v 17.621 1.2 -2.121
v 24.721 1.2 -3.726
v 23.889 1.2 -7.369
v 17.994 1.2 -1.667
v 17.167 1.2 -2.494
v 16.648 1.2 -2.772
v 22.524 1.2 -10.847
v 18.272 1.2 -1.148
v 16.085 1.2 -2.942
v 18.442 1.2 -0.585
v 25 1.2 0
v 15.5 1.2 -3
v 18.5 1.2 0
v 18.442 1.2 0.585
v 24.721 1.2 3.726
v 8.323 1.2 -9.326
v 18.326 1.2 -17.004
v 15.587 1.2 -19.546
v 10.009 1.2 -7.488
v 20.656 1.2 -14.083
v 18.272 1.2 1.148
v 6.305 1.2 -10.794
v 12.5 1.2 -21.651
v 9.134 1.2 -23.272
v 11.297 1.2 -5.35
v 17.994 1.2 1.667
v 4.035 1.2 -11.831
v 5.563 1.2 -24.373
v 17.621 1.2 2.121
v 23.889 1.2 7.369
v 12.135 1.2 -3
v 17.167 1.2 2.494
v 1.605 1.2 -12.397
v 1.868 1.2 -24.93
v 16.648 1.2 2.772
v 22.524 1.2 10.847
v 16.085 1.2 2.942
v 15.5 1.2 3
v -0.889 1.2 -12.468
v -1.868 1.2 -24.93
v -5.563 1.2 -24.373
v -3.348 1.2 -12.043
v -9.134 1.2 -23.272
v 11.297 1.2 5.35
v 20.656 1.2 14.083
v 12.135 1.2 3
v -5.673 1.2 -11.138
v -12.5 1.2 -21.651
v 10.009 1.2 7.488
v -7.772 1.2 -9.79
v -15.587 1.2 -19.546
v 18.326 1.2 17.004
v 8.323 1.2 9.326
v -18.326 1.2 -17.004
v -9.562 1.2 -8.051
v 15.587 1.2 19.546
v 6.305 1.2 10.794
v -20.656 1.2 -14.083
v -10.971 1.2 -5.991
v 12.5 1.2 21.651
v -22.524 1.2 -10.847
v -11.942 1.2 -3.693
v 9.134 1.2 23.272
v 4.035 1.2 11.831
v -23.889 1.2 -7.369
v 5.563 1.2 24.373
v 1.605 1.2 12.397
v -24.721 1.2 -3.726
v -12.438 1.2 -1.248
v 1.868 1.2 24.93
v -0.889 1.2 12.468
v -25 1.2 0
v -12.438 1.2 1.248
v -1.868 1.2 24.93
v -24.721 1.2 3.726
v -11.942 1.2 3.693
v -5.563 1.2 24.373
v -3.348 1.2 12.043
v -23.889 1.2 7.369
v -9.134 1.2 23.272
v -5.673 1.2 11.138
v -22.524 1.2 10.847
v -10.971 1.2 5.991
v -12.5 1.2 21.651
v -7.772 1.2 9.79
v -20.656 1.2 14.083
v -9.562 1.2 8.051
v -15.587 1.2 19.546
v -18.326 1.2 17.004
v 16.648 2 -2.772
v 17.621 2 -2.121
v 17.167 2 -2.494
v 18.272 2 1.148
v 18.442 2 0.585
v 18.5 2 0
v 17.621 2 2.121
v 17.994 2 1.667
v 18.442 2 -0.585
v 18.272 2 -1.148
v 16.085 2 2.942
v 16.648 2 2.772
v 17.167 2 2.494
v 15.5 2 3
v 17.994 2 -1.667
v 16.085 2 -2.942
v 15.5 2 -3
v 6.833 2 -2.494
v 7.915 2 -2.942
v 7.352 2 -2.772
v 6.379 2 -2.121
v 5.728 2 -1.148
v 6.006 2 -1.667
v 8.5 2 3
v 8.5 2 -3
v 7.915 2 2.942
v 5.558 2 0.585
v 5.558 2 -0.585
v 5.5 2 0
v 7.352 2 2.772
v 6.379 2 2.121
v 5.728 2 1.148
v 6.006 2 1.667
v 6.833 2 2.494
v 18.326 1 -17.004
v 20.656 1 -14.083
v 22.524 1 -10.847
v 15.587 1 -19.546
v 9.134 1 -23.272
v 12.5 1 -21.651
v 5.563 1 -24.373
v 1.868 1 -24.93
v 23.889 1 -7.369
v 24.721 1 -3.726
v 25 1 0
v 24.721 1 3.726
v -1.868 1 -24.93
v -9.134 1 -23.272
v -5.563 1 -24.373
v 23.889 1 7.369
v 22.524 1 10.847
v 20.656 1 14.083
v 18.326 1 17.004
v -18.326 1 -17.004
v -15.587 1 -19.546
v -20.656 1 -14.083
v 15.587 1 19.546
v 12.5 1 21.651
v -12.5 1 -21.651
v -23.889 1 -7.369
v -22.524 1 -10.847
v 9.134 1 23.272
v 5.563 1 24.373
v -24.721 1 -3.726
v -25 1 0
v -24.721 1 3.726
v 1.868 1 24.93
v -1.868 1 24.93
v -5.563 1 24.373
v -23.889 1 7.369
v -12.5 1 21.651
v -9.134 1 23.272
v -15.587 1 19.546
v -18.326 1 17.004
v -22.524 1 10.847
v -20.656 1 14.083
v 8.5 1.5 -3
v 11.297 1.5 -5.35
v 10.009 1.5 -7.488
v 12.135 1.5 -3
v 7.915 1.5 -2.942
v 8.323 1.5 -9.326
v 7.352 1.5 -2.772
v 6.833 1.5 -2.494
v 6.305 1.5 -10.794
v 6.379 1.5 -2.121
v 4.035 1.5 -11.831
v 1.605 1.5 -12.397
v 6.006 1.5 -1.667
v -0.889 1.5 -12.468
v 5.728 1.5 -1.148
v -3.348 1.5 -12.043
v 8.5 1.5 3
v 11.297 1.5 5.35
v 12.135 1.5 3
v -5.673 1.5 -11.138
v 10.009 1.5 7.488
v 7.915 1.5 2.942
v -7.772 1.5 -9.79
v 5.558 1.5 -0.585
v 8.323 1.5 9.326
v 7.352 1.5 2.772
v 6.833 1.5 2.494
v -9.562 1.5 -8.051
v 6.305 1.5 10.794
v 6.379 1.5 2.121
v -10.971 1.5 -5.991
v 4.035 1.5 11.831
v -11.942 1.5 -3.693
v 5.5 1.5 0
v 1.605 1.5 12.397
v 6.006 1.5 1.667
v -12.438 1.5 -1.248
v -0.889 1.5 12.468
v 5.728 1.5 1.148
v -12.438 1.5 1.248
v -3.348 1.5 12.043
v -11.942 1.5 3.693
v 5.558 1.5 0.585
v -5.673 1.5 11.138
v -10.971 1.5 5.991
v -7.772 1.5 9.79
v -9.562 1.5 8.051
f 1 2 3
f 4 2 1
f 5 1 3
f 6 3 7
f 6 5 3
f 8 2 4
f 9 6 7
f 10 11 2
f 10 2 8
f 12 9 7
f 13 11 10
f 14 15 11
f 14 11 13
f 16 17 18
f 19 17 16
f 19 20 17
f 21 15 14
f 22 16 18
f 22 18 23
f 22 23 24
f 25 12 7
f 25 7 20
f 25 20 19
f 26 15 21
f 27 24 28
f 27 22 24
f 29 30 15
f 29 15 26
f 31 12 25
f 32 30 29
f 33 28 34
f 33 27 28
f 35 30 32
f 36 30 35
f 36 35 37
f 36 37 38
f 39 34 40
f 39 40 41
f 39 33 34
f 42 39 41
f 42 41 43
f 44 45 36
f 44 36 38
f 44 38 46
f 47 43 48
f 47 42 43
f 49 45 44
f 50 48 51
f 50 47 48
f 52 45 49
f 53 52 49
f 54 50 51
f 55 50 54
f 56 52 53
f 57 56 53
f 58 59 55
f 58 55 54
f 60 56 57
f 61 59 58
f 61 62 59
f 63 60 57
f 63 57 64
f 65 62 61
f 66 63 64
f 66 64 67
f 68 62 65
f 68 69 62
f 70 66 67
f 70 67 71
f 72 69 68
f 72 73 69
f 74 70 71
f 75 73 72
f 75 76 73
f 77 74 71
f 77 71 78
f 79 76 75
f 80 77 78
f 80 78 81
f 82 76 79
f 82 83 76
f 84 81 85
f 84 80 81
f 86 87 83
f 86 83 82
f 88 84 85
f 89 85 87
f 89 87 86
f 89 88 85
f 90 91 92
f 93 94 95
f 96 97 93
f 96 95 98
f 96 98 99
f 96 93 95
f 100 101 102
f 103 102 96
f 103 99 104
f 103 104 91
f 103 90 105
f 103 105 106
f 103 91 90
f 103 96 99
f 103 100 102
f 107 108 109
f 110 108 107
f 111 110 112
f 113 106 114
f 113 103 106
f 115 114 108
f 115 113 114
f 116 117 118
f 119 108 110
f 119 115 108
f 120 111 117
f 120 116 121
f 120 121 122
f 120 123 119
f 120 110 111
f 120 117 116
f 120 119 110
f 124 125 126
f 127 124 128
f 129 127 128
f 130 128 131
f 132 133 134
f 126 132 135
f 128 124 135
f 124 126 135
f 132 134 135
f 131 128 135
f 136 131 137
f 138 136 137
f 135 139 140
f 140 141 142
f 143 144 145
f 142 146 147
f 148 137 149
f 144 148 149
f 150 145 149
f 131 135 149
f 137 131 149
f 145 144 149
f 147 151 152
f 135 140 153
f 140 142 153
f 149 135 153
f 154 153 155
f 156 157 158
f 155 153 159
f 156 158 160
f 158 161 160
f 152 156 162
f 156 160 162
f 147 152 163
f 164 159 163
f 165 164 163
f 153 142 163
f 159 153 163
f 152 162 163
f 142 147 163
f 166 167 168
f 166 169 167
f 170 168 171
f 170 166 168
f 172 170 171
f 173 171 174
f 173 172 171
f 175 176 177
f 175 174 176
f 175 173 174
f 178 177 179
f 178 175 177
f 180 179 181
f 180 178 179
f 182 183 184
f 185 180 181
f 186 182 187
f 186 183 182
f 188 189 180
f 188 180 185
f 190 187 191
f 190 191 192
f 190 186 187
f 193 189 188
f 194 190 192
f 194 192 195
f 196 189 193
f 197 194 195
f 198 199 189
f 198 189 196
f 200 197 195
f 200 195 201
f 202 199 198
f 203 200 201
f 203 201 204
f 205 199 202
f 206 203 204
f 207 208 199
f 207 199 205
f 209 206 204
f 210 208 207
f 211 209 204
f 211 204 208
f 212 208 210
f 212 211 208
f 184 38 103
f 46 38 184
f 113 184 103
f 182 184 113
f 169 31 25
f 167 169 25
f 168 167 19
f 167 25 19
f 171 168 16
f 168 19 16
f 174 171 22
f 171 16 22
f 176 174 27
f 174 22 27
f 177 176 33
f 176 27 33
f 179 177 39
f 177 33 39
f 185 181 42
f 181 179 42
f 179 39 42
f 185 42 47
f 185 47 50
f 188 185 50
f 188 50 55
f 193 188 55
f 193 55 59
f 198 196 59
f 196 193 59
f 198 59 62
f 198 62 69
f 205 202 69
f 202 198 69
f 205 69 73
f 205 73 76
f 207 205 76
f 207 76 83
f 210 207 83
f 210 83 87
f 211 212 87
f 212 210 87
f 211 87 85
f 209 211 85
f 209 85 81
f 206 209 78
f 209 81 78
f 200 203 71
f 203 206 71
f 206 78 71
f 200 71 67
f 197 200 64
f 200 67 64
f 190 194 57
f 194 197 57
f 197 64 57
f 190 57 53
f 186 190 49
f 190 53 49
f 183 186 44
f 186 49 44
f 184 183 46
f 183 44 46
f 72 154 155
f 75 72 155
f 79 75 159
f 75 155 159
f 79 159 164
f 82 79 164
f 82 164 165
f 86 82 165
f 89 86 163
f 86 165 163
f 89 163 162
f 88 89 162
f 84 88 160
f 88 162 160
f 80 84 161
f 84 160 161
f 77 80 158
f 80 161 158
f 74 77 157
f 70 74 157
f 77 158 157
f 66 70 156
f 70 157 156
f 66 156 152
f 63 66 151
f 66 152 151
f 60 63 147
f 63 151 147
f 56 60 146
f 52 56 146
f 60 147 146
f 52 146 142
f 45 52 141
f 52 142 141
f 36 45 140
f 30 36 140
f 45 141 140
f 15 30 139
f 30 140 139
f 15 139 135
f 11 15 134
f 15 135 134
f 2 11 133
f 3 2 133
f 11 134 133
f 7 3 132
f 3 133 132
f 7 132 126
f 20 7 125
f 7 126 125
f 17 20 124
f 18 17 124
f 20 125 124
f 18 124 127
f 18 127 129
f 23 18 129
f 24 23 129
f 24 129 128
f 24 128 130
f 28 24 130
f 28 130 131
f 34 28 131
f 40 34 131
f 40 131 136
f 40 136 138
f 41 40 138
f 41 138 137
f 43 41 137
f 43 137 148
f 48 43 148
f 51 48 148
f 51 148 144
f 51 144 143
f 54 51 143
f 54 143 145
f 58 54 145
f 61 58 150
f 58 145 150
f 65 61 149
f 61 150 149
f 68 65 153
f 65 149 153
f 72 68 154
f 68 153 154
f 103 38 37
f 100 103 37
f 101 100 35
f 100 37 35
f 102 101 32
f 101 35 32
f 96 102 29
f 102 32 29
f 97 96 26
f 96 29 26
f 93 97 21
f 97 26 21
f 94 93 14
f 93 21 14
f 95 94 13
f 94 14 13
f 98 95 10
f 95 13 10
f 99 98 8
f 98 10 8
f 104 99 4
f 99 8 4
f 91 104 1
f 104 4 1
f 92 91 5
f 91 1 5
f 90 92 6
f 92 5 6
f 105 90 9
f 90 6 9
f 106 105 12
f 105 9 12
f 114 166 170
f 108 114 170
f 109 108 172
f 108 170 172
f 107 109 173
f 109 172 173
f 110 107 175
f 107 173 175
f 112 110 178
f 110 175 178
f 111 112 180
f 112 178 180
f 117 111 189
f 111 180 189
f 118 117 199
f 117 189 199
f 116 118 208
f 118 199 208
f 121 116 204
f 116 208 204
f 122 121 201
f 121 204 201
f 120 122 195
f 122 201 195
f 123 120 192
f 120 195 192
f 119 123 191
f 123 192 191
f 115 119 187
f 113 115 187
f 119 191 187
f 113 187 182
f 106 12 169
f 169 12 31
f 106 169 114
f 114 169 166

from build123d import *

# Parameters (mm, degrees)
SKETCH_R             = 25
PAD_DEPTH            = 0.2
SKETCH001_R          = 12.5
PAD001_DEPTH         = 0.5
PAD002_DEPTH         = 1
BODY_PLACEMENT_ANGLE = 180


with BuildPart() as part:
    # Sketch → Pad (new body)
    with BuildSketch(Plane.XZ):
        Circle(SKETCH_R)
    extrude(amount=PAD_DEPTH)

    # Sketch001 → Pad001 (join)
    with BuildSketch(Plane.XZ):
        Circle(SKETCH001_R)
    extrude(amount=PAD001_DEPTH)

    # Sketch002 → Pad002 (join)
    with BuildSketch(Plane.XZ):
        with BuildLine():
            ThreePointArc((-15.5, 3), (-18.5, 0), (-15.5, -3))
            Line((-15.5, -3), (-8.5, -3))
            ThreePointArc((-8.5, -3), (-5.5, 0), (-8.5, 3))
            Line((-15.5, 3), (-8.5, 3))
        make_face()
    extrude(amount=PAD002_DEPTH)


with BuildPart() as part_1:
    # Body placement: moved
    add(part.part.moved(Location((0, 1, 0))).rotate(Axis((0, 1, 0), (0, 0, 1)), BODY_PLACEMENT_ANGLE))


solid = part_1.part
